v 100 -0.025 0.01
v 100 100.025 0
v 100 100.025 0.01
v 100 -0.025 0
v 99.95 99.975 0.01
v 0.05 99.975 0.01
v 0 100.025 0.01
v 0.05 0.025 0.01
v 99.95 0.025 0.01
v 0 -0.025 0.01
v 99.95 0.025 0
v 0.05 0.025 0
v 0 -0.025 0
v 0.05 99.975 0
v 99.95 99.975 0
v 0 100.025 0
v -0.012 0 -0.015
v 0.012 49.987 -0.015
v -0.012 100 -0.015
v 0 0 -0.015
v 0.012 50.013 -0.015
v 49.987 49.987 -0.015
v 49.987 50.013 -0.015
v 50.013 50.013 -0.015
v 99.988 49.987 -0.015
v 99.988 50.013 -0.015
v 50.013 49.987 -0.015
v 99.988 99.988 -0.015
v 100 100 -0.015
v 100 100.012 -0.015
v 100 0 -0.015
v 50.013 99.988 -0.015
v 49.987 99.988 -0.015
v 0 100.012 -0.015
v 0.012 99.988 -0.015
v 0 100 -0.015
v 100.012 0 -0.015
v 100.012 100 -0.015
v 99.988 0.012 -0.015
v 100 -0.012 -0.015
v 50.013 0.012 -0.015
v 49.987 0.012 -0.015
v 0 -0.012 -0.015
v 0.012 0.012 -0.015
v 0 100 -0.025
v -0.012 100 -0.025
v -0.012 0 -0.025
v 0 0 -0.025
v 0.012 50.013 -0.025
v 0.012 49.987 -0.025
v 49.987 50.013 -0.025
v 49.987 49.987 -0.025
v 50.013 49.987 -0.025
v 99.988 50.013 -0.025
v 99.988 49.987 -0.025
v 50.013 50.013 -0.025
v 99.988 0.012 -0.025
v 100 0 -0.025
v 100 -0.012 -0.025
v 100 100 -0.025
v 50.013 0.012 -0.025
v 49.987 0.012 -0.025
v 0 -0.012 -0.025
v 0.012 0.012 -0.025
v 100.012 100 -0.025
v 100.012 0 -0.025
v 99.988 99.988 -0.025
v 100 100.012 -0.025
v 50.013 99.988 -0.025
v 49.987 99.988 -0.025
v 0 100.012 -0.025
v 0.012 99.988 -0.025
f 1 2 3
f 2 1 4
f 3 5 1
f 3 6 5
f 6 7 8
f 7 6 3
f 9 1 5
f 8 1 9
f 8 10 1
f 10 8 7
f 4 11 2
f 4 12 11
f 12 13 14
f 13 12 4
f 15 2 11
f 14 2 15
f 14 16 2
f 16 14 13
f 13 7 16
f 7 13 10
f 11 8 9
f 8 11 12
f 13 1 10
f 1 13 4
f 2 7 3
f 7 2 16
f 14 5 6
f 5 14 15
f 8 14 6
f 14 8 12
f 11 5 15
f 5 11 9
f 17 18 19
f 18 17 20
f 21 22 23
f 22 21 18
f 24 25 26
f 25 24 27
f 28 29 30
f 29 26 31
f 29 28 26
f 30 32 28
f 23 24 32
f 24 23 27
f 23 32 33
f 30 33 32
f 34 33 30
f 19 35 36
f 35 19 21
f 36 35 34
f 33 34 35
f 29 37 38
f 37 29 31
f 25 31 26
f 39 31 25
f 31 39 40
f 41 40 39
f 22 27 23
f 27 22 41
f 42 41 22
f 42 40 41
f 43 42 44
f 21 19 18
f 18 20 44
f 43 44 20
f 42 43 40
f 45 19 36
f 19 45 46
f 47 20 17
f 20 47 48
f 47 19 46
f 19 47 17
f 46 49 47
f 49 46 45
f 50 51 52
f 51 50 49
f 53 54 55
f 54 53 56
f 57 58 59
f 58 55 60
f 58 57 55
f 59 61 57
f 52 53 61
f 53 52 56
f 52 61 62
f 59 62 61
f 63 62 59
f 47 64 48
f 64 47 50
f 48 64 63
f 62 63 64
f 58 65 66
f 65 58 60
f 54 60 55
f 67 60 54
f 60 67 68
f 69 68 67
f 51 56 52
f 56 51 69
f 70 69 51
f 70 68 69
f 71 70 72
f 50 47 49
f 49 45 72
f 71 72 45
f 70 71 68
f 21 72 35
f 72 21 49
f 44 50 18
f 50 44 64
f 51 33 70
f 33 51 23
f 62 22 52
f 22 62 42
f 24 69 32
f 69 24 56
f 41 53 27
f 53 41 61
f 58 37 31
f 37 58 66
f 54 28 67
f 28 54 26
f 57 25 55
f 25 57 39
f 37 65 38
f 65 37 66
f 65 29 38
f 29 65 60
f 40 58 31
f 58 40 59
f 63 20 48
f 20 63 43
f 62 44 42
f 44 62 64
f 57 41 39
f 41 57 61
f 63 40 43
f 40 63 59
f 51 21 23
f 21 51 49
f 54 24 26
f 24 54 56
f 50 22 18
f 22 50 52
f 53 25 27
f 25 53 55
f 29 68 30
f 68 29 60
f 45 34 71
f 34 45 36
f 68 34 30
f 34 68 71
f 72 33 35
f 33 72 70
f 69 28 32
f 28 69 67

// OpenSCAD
// file: ../drawing_sheet_sizes.scad
// drawing_sheet_sizes.scad
sheet_sizes = [
    // ISO 216 (A-Series)
    ["A0", [841, 1189]],
    ["A1", [594, 841]],
    ["A2", [420, 594]],
    ["A3", [297, 420]],
    ["A4", [210, 297]],

    // ANSI Standard (U.S.)
    ["ANSI_A", [216, 279]], // 8.5 × 11 inches
    ["ANSI_B", [279, 432]], // 11 × 17 inches
    ["ANSI_C", [432, 559]], // 17 × 22 inches
    ["ANSI_D", [559, 864]], // 22 × 34 inches
    ["ANSI_E", [864, 1118]], // 34 × 44 inches

    // Architectural Sizes (U.S.)
    ["ARCH_A", [229, 305]], // 9 × 12 inches
    ["ARCH_B", [305, 457]], // 12 × 18 inches
    ["ARCH_C", [457, 610]], // 18 × 24 inches
    ["ARCH_D", [610, 914]], // 24 × 36 inches
    ["ARCH_E", [914, 1219]], // 36 × 48 inches

    // ASME Y14.1 (Engineering Drawings)
    ["ENG_A", [216, 279]], // Same as ANSI A
    ["ENG_B", [279, 432]], // Same as ANSI B
    ["ENG_C", [432, 559]], // Same as ANSI C
    ["ENG_D", [559, 864]], // Same as ANSI D
    ["ENG_E", [864, 1118]], // Same as ANSI E

    // JIS B-Series (Japan)
    ["B0", [1030, 1456]],
    ["B1", [728, 1030]],
    ["B2", [515, 728]],
    ["B3", [364, 515]],
    ["B4", [257, 364]],
];
// file: ../src/dd_titleblock.scad
/**
 * @file dd_titleblock.scad
 * @brief Functions for creating title blocks on drawing sheets.
 * @details This file contains functions for creating title blocks on drawing sheets. The titleblock function creates a
 * title block with lines, descriptions, and details based on the given parameters.
 * @copyright (c) 2021 Don Smiley, (c) 2025 Cameron K. Brooks
 */

/*
 * titleblock(lines, descs, details, color, text_color)
 * Creates a title block for a drawing sheet, including lines, descriptions, and details.
 * Parameters:
 * - lines: Array defining the lines in the title block with format:
 *           [[startx, starty, orientation, length, width], ...]
 *           - orientation: Use DIM_HORZ or DIM_VERT for horizontal/vertical lines.
 *           - width: Factor to scale the line width beyond DIM_LINE_WIDTH.
 * - descs: Array defining descriptive text blocks with format:
 *           [[startx, starty, orientation, text, size], ...]
 *           - size: Factor to scale font size beyond DIM_FONTSCALE.
 * - details: Array defining part-specific details with format:
 *           [[startx, starty, orientation, text, size], ...]
 * - color: Line color.
 * - text_color: Text color.
 * Behavior:
 * - Draws lines and places text (descriptions and details) at specified positions.
 * - Handles horizontal and vertical orientations for text and lines.
 */
module titleblock(lines, descs, details, color = DEF_LINE_COLOR, text_color = DEF_TEXT_COLOR) {
    DIM_FONTSCALE = DIM_LINE_WIDTH * 0.7;

    for (line = lines)
    {
        color(color) translate([line[0] * DIM_LINE_WIDTH, line[1] * DIM_LINE_WIDTH, 0]) if (line[2] == DIM_VERT) {
                // a vertical line runs down from its start point, and line() draws upward
                translate([0, -line[3] * DIM_LINE_WIDTH, 0])
                    line(length=line[3] * DIM_LINE_WIDTH, width=DIM_LINE_WIDTH * line[4], vert=true);
            } else {
                line(length=(line[3] + 1) * DIM_LINE_WIDTH, width=DIM_LINE_WIDTH * line[4]);
            }
    }

    color(text_color) {
        for (line = descs)
        {
            translate([line[0] * DIM_LINE_WIDTH, line[1] * DIM_LINE_WIDTH, 0]) if (line[2] == DIM_VERT) {
                rotate([0, 0, 90])
                    scale([DIM_FONTSCALE * line[4], DIM_FONTSCALE * line[4], DIM_FONTSCALE * line[4]]) text(line[3]);
            } else {
                scale([DIM_FONTSCALE * line[4], DIM_FONTSCALE * line[4], DIM_FONTSCALE * line[4]]) text(line[3]);
            }
        }

        for (line = details)
        {
            translate([line[0] * DIM_LINE_WIDTH, line[1] * DIM_LINE_WIDTH, 0]) if (line[2] == DIM_VERT) {
                rotate([0, 0, 90])
                    scale([DIM_FONTSCALE * line[4], DIM_FONTSCALE * line[4], DIM_FONTSCALE * line[4]]) text(line[3]);
            } else {
                scale([DIM_FONTSCALE * line[4], DIM_FONTSCALE * line[4], DIM_FONTSCALE * line[4]]) text(line[3]);
            }
        }
    }
}
// file: ../src/dd_sheet.scad
/**
 * @file dd_sheet.scad
 * @brief Functions for drawing sheets from standard sizes and grid patterns.
 * @details This file contains functions for drawing sheets with standard sizes and grid patterns. The draw_sheet
 * function can draw a sheet boundary based on given dimensions or a standard sheet symbol with a grid or dot pattern.
 * @copyright (c) 2025 Cameron K. Brooks, (c) 2021 Don Smiley
 */

include <../drawing_sheet_sizes.scad>;

/*
 * draw_sheet(length, height, sheet_symbol, grid_type, line_width, color)
 * Draws a sheet boundary based on given dimensions or a standard sheet symbol and adds a grid or dot pattern if
 * specified. Parameters:
 * - length: Length of the sheet (overridden if sheet_symbol is provided).
 * - height: Height of the sheet (overridden if sheet_symbol is provided).
 * - sheet_symbol: Standard sheet size identifier (e.g., "A4", "ANSI_B").
 * - grid_type: "None", "Dot", or "Grid" to specify the background pattern.
 * - line_width: Thickness of the sheet boundary lines.
 * - color: Optional parameter to set the frame's color.
 */
module draw_sheet(
    length = undef,
    height = undef,
    sheet_symbol = undef,
    line_width = DIM_LINE_WIDTH * 2,
    line_height = DIM_LINE_HEIGHT,
    grid_type = "None",
    grid_dim = DIM_GRID_SPACING,
    grid_line_width = DIM_LINE_WIDTH,
    color = DEF_LINE_COLOR
) {
    // If a sheet symbol is provided, it overrides length and height using the sheet_sizes array.
    // An assignment inside an if block is local to that block, so the size is resolved here.
    matches = is_undef(sheet_symbol) ? [] : [for (sheet = sheet_sizes) if (sheet[0] == sheet_symbol) sheet[1]];
    sheet_length = len(matches) > 0 ? matches[0][0] : length;
    sheet_height = len(matches) > 0 ? matches[0][1] : height;

    if (!is_undef(sheet_symbol)) {
        echo("Looking for sheet symbol: ", sheet_symbol);

        if (len(matches) > 0) {
            echo("Match found for sheet symbol: ", sheet_symbol, " Dimensions: ", matches[0]);
        } else {
            echo("Warning: Sheet symbol '", sheet_symbol, "' not found.");
        }
    }

    // Proceed only if length and height are defined
    if (!is_undef(sheet_length) && !is_undef(sheet_height)) {
        // Draw the grid or dots before drawing the frame to ensure it's in the background
        draw_frame(sheet_length, sheet_height, line_width, line_height, color);
        translate([0, 0, -DIM_LINE_WIDTH])
            draw_grid(sheet_length, sheet_height, grid_type, grid_dim, grid_line_width, line_height, "lightgray");
    } else {
        echo("Warning: Invalid dimensions. Frame not drawn.");
    }
}

module draw_frame(length, height, line_width = DIM_LINE_WIDTH, line_height = DIM_LINE_HEIGHT, color = DEF_LINE_COLOR) {
    /*
     * draw_frame(length, height, line_width, color)
     * Draws the rectangular frame of a sheet with specified dimensions and line width.
     * Parameters:
     * - length: Length of the sheet frame.
     * - height: Height of the sheet frame.
     * - line_width: Thickness of the frame lines.
     * - color: Optional parameter to set the frame's color.
     * Behavior:
     * - Creates a rectangular frame with horizontal and vertical lines.
     */
    color(color) {
        // Bottom horizontal line
        line(length=length, width=line_width, height=line_height);

        // Top horizontal line
        translate([0, height, 0]) line(length=length, width=line_width, height=line_height);

        // Left vertical line
        translate([line_width / 2, line_width / 2, 0])
            line(length=height - line_width, width=line_width, height=line_height, vert=true);

        // Right vertical line
        translate([length - line_width / 2, line_width / 2, 0])
            line(length=height - line_width, width=line_width, height=line_height, vert=true);
    }
}

module draw_grid(
    length,
    height,
    type = "None",
    grid_spacing = DIM_GRID_SPACING,
    line_width = DIM_LINE_WIDTH / 2,
    line_height = DIM_LINE_HEIGHT,
    color = "lightgray"
) {
    /*
     * draw_grid(length, height, type, grid_spacing, line_width, color)
     * Adds a grid or dot pattern to the sheet.
     * Parameters:
     * - length: Length of the sheet.
     * - height: Height of the sheet.
     * - type: "None", "Dot", or "Grid" to specify the background pattern.
     * - grid_spacing: Distance between grid lines or dots.
     * - line_width: Thickness of grid lines (ignored for dots).
     * - color: Color of the grid lines or dots.
     */

    if (type == "Grid") {
        color(color) {
            // Draw vertical grid lines
            for (x = [0:grid_spacing:length])
            {
                translate([x, 0, 0]) line(length=height, width=line_width, height=line_height, vert=true);
            }

            // Draw horizontal grid lines
            for (y = [0:grid_spacing:height])
            {
                translate([0, y, 0]) line(
                        length=length, width=line_width, height=line_height,
                        left_arrow=false, right_arrow=false
                    );
            }
        }
    } else if (type == "Dot") {
        color(color) {
            // Define dot size
            dot_size = line_width; // You can adjust the dot size as needed

            for (x = [0:grid_spacing:length])
            {
                for (y = [0:grid_spacing:height])
                {
                    translate([x, y, 0]) sphere(r=dot_size, $fn=12);
                }
            }
        }
    } else {
        echo("No grid or dot pattern selected.");
    }
}
// file: ../dimdraft.scad
// ----- Variables -----
DOC_SCALING_FACTOR = is_undef(SCALING_FACTOR) ? 1 : SCALING_FACTOR;

// Line and text related constants

DIM_LINE_WIDTH_NOMINAL = 0.025; // Nominal line width
DIM_SPACE_NOMINAL = 0.1; // Nominal spacing value for line spacing adjustments
DIM_LINE_HEIGHT_NOMINAL = 0.01; // Nominal height of lines

DIM_LINE_WIDTH =
    is_undef(LINE_WIDTH) ? DIM_LINE_WIDTH_NOMINAL * DOC_SCALING_FACTOR : LINE_WIDTH; // Width of the dimension lines
DIM_LINE_HEIGHT =
    is_undef(HEIGHT) ? DIM_LINE_HEIGHT_NOMINAL * DOC_SCALING_FACTOR : HEIGHT; // Height of the dimension lines
DIM_SPACE =
    is_undef(SPACE) ? DIM_SPACE_NOMINAL * DOC_SCALING_FACTOR : SPACE; // Spacing value for line spacing adjustments

DEF_LINE_COLOR = is_undef(LINE_COLOR) ? "black" : LINE_COLOR; // Default line color
DEF_TEXT_COLOR = is_undef(TEXT_COLOR) ? "black" : TEXT_COLOR; // Default text color

// ----- Dependent Constants -----
// Hole center constant
DIM_HOLE_CENTER = DIM_LINE_WIDTH * 6; // Size of the cross within a circle
// Text is drawn at OpenSCAD's default size of 10 and scaled by DIM_FONTSCALE.
// Its height is 7 line widths unless TEXT_SIZE is set.
DIM_FONTSCALE = is_undef(TEXT_SIZE) ? DIM_LINE_WIDTH * 0.7 : TEXT_SIZE / 10;
DIM_TEXT_SIZE = DIM_FONTSCALE * 10; // Height of the text

DIM_GRID_SPACING = 50; // Default grid spacing value, standard for most drawings (i.e. ISO, ANSI, etc.)

// ----- Constants -----
// Dimension positioning constants
DIM_CENTER = 0;
DIM_LEFT = 1;
DIM_RIGHT = 2;
DIM_OUTSIDE = 3;

// Orientation constants
DIM_HORZ = 0;
DIM_VERT = 1;

// Corner positioning constants
DIM_UPPER_LEFT = 0;
DIM_UPPER_RIGHT = 1;
DIM_LOWER_LEFT = 2;
DIM_LOWER_RIGHT = 3;

// Offset value for hole length
ZFITE = 0.05; // Added to the hole length to extend past the surface of the cube

include <src/dd_dimlines.scad>;
include <src/dd_sheet.scad>;
include <src/dd_titleblock.scad>;
// main file
// draw_sheet with a line grid must evaluate with no warning and draw grid lines of the default width and height.
// expect: cube\(size = \[100, 0\.025, 0\.01\]
include <../dimdraft.scad>

draw_sheet(length=100, height=100, grid_type="Grid");
